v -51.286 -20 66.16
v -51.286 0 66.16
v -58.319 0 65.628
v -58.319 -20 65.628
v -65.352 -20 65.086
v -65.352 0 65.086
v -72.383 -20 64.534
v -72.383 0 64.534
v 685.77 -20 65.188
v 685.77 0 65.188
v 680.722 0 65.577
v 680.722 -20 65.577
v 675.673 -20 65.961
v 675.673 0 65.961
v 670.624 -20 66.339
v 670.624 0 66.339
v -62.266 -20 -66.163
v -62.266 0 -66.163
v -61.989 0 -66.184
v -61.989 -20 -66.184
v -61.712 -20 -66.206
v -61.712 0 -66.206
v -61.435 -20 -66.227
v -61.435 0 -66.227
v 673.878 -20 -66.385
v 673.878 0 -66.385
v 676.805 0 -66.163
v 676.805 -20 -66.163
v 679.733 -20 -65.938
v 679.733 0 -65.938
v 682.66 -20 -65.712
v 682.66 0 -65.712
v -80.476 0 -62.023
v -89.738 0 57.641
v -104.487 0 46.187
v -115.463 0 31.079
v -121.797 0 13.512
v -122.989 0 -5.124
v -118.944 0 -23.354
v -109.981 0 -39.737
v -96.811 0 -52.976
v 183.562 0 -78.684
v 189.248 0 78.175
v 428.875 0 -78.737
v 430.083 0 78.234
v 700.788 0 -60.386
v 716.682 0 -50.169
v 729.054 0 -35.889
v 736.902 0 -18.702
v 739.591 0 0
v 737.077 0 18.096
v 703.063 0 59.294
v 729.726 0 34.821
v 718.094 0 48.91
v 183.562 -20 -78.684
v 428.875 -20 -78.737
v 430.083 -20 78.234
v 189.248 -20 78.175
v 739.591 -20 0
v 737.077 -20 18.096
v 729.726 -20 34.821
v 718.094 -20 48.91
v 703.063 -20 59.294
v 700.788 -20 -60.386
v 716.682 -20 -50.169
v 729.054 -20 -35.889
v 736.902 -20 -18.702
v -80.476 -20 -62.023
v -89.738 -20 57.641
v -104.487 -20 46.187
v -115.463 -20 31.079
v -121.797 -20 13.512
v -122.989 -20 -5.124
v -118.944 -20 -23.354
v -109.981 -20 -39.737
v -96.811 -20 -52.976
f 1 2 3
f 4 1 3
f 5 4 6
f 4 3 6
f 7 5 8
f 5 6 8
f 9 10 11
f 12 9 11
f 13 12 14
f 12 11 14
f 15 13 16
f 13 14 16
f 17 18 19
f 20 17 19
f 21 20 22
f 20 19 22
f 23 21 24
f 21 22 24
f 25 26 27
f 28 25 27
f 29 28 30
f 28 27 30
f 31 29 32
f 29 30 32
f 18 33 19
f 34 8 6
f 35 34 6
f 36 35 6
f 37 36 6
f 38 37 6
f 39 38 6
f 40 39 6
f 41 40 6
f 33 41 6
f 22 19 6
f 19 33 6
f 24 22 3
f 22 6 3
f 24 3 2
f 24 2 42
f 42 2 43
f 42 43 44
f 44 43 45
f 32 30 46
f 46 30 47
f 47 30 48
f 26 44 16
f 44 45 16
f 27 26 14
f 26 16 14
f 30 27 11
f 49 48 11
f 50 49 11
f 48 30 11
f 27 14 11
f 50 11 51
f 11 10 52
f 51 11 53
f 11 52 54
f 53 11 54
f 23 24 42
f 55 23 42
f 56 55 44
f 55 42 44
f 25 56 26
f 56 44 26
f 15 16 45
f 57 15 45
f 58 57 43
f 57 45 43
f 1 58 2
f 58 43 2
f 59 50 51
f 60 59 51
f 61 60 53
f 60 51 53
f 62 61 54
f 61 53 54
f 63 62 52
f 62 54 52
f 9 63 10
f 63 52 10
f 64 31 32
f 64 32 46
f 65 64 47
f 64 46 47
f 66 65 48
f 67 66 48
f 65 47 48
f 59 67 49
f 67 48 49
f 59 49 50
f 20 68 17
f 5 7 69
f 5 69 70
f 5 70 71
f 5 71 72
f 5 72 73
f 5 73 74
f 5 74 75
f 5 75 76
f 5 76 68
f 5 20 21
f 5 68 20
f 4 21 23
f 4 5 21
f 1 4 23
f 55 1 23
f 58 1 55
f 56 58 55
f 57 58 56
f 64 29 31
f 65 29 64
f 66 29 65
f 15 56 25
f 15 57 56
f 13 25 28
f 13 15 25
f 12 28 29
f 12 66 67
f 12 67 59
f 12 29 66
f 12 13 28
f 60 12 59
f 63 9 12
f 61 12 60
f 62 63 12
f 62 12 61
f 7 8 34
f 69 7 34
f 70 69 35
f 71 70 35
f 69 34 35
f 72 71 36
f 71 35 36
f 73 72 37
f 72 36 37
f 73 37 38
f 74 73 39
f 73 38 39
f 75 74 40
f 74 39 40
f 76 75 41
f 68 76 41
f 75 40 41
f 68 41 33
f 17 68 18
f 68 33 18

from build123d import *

# Parameters (mm, degrees)
F1_DEPTH = 20


with BuildPart() as f1:
    # F0 (on Front) → F1 (new body)
    with BuildSketch(Plane.XZ):
        with BuildLine():
            ThreePointArc((670.6236231078, 66.3387719466), (309.6652800425, 79.699666295), (-51.2863881664, 66.159646229))
            ThreePointArc((-51.2863881664, 66.159646229), (-7.9443574248, 44.95304923), (9.5906005169, 0))
            Line((9.5906005169, 0), (606.8129005169, 0))
            ThreePointArc((606.8129005169, 0), (625.3549203284, 46.0234749366), (670.6236231078, 66.3387719466))
        make_face()
        with BuildLine():
            ThreePointArc((9.5906005169, 0), (-11.5233416669, -48.5557630622), (-61.4352457375, -66.2267141723))
            ThreePointArc((-61.4352457375, -66.2267141723), (306.2183279395, -80.2613301697), (673.8779251557, -66.3854064699))
            ThreePointArc((673.8779251557, -66.3854064699), (626.4974201628, -47.1824642266), (606.8129005169, 0))
            Line((606.8129005169, 0), (9.5906005169, 0))
        make_face()
        with BuildLine():
            ThreePointArc((-51.2863881664, 66.159646229), (-61.8356743177, 65.3581420921), (-72.3831869864, 64.5336278799))
            ThreePointArc((-72.3831869864, 64.5336278799), (-122.9890910705, -5.1236602419), (-62.2662803124, -66.1632831952))
            ThreePointArc((-62.2662803124, -66.1632831952), (-61.8507643875, -66.195016535), (-61.4352457375, -66.2267141723))
            ThreePointArc((-61.4352457375, -66.2267141723), (-11.5233416669, -48.5557630622), (9.5906005169, 0))
            ThreePointArc((9.5906005169, 0), (-7.9443574248, 44.95304923), (-51.2863881664, 66.159646229))
        make_face()
        with BuildLine():
            ThreePointArc((685.7701519609, 65.1883017839), (678.1973379425, 65.7694667188), (670.6236231078, 66.3387719466))
            ThreePointArc((670.6236231078, 66.3387719466), (625.3549203284, 46.0234749366), (606.8129005169, 0))
            ThreePointArc((606.8129005169, 0), (626.4974201628, -47.1824642266), (673.8779251557, -66.3854064699))
            ThreePointArc((673.8779251557, -66.3854064699), (678.2691787155, -66.0505126994), (682.6601263672, -65.7116316233))
            ThreePointArc((682.6601263672, -65.7116316233), (723.3784886527, -43.4715349899), (739.5906005169, 0))
            ThreePointArc((739.5906005169, 0), (724.3968729532, 42.2674679045), (685.7701519609, 65.1883017839))
        make_face()
    extrude(amount=F1_DEPTH)


solid = f1.part
